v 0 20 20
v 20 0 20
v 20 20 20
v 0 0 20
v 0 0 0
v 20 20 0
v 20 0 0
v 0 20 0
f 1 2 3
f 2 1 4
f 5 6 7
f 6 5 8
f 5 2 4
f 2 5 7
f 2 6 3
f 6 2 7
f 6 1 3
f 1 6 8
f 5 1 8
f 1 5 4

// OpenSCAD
// TEST FILE FOR SAFETY AUDIT
// WARNING: This wall thickness is 0.5mm (Too thin for prosthetics)
thickness = 0.5;

cube([20, 20, 20]);
// No smoothing ($fn) defined - sharp edges risk!
